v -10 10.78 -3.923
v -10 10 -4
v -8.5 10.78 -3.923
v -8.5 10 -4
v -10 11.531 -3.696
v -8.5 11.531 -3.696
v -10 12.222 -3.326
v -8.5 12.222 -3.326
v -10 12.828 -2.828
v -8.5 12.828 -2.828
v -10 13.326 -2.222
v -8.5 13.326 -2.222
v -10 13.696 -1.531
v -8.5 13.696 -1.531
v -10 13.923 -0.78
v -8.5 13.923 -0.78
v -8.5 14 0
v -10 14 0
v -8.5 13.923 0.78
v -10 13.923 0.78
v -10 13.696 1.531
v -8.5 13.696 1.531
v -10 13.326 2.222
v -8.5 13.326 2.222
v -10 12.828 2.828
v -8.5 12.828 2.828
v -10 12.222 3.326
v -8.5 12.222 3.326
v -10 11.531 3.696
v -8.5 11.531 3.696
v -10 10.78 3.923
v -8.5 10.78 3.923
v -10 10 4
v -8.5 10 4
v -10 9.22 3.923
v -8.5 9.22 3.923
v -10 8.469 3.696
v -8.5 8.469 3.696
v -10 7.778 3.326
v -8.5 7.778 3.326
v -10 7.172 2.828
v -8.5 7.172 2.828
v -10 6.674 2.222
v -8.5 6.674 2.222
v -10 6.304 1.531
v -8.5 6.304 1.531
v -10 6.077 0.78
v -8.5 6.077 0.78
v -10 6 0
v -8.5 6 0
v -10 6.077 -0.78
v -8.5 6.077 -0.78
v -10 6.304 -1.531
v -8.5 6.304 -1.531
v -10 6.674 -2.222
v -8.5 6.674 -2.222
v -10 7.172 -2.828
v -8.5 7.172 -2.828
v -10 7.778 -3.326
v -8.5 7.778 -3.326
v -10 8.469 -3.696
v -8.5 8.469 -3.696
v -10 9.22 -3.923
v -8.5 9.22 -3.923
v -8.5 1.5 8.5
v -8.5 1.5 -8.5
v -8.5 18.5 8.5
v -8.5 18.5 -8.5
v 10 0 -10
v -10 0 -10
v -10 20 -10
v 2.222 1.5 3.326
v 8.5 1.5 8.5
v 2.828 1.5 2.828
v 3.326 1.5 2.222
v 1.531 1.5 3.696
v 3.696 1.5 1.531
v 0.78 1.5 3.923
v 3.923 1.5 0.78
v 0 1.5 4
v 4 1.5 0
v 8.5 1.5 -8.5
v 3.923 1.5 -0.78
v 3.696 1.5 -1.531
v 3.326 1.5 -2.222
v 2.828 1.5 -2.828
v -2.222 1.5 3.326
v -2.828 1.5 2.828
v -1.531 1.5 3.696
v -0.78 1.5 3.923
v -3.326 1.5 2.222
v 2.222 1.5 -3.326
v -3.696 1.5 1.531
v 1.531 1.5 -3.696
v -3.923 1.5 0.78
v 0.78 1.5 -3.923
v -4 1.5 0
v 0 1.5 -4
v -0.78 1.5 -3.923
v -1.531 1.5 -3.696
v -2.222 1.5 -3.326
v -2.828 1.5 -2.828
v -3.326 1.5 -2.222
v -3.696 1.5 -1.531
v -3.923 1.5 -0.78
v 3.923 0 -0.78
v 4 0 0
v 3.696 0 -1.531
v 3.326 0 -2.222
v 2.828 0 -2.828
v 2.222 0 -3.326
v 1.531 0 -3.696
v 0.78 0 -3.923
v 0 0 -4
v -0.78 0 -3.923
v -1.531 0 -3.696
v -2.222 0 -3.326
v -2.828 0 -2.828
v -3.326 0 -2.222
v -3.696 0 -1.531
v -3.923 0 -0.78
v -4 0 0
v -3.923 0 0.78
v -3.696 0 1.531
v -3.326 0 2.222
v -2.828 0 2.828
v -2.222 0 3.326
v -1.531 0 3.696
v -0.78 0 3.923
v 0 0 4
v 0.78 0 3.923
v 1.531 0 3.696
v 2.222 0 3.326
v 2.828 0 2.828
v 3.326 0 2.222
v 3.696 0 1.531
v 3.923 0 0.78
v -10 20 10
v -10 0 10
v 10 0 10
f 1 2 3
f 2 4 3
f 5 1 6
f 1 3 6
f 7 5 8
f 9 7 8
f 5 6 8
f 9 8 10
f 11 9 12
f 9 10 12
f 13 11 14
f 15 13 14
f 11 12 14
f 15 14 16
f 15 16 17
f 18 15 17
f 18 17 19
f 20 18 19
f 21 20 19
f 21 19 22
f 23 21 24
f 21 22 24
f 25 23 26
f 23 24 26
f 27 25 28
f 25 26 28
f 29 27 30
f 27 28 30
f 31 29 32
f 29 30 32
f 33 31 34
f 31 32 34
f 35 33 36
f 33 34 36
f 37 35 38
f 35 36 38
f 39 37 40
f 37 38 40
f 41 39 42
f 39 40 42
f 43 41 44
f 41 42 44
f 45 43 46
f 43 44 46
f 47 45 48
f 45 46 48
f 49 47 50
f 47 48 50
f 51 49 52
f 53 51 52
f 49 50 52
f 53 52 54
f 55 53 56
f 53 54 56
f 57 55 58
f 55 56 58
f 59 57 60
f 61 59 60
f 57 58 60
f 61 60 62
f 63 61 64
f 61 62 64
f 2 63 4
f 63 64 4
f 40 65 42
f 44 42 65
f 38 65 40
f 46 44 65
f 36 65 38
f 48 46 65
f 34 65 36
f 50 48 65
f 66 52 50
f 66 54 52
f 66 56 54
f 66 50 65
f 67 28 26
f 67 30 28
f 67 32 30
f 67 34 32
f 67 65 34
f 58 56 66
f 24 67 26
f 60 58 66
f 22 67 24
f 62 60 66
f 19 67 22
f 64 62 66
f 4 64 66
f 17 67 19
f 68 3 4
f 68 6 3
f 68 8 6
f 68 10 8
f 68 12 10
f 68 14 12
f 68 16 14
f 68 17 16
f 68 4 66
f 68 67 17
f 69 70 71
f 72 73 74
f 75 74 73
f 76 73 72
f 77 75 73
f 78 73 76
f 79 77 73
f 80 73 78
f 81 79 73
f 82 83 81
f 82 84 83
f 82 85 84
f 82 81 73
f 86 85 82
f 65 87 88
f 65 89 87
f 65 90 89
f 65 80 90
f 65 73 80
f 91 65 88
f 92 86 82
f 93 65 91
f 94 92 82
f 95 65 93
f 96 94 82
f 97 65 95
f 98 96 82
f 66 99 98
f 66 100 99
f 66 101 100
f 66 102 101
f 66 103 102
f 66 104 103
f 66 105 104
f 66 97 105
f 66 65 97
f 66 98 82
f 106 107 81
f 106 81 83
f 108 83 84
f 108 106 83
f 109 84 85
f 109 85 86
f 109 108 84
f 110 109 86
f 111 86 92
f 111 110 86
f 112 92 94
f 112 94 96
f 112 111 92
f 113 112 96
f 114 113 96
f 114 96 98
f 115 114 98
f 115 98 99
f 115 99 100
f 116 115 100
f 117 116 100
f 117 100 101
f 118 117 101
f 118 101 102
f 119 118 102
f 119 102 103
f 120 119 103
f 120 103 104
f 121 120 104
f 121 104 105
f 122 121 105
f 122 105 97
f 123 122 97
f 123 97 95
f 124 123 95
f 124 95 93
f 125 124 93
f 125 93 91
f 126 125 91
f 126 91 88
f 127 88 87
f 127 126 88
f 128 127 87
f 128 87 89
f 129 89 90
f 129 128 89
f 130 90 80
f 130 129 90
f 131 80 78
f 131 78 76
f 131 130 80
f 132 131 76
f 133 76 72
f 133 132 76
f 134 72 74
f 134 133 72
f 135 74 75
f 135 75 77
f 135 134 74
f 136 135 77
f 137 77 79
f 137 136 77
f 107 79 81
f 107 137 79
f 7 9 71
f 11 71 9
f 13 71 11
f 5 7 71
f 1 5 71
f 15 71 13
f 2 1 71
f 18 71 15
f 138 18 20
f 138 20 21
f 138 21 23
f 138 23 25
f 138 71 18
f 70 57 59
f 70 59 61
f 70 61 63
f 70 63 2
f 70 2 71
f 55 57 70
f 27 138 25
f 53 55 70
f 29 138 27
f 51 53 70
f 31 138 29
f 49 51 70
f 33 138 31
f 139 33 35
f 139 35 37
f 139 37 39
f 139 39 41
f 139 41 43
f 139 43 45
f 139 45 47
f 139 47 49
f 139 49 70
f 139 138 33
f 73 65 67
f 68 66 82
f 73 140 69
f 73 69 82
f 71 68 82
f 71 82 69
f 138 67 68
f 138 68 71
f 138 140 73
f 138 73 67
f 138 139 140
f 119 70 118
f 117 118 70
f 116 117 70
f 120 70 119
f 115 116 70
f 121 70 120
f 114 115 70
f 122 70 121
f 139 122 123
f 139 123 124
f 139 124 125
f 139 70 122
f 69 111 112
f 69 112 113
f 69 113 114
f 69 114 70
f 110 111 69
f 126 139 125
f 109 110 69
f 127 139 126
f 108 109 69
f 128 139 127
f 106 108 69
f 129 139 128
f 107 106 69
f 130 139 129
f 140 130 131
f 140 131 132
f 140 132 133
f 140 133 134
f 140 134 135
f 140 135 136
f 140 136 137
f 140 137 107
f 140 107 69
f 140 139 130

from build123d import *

# Parameters (mm, degrees)
BOSS_EXTRUDE1_DEPTH     = 10
SKETCH3_R               = 4
CUT_EXTRUDE1_DEPTH      = 20
SKETCH4_R               = 4
CUT_EXTRUDE2_DEPTH      = 10
SKETCH5_W               = 17
SKETCH5_H               = 18.5
CUT_EXTRUDE3_DEPTH      = 10
CUT_EXTRUDE3_DEPTH_BACK = 8.5


with BuildPart() as part:
    # Sketch1 → Boss-Extrude1 (new body, symmetric)
    with BuildSketch(Plane.XY):
        Polygon((-10, 0), (10, 0), (-10, 20), align=None)
    extrude(amount=BOSS_EXTRUDE1_DEPTH, both=True)

    # Sketch3 → Cut-Extrude1 (cut)
    with BuildSketch(Plane(origin=(0, 0, 0), x_dir=(1, 0, 0), z_dir=(0, 1, 0))):
        Circle(SKETCH3_R)
    extrude(amount=CUT_EXTRUDE1_DEPTH, mode=Mode.SUBTRACT)

    # Sketch4 → Cut-Extrude2 (cut, symmetric)
    with BuildSketch(Plane(origin=(0, 0, 0), x_dir=(0, 0, -1), z_dir=(1, 0, 0))):
        with Locations((0, 10)):
            Circle(SKETCH4_R)
    extrude(amount=CUT_EXTRUDE2_DEPTH, both=True, mode=Mode.SUBTRACT)

    # Sketch5 → Cut-Extrude3 (cut, two sides)
    with BuildSketch(Plane(origin=(0, 0, 0), x_dir=(0, 0, -1), z_dir=(1, 0, 0))) as cut_extrude3_sk:
        with Locations((0, 10.75)):
            Rectangle(SKETCH5_W, SKETCH5_H)
    extrude(amount=CUT_EXTRUDE3_DEPTH, mode=Mode.SUBTRACT)
    extrude(cut_extrude3_sk.sketch, amount=-CUT_EXTRUDE3_DEPTH_BACK, mode=Mode.SUBTRACT)


solid = part.part
